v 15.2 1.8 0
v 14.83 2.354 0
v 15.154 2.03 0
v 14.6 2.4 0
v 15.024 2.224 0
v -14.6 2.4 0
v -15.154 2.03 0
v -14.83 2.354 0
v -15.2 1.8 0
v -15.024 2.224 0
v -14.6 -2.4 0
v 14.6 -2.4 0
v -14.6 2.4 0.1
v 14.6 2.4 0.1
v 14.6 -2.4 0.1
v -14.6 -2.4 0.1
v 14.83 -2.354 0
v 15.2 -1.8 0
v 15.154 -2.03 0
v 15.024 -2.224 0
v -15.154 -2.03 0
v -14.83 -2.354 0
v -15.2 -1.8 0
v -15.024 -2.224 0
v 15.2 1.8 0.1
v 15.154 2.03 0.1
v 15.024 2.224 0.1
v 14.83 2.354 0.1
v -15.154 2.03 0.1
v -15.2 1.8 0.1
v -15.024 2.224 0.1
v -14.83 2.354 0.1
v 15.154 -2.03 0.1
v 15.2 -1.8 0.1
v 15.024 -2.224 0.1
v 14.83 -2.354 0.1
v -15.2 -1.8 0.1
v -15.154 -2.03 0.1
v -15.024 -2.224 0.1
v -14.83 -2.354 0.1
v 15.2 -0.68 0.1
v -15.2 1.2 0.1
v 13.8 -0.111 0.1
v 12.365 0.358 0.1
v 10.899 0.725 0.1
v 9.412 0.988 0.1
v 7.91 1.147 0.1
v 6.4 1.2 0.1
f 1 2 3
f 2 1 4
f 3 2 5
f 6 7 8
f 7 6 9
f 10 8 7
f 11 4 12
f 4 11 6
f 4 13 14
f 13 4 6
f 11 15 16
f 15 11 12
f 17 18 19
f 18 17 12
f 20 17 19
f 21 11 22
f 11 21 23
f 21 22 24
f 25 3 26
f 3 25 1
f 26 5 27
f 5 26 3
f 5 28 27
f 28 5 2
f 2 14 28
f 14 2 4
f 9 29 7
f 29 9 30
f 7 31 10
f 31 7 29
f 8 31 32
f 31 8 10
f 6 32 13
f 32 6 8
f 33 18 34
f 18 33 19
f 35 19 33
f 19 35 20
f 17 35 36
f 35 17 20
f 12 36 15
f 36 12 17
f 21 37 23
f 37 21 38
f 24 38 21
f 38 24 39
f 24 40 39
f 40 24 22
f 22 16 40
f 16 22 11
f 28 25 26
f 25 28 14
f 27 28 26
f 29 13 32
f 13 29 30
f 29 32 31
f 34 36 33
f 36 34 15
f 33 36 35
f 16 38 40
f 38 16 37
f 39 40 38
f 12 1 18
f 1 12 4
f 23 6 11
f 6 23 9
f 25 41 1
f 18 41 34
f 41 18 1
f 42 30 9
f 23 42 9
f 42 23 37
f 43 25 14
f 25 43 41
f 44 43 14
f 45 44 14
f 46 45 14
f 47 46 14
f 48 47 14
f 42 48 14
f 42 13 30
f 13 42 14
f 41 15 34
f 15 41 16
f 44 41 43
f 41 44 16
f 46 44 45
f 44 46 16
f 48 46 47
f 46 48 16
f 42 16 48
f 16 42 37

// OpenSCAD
// file: ../p/box3u12.scad
use <../lib.scad>
function ldraw_lib__box3u12() = [
// 0 Box with 3 Parallel Faces without Any Edges
// 0 Name: box3u12.dat
// 0 Author: J.C. Tchang [tchang]
// 0 !LDRAW_ORG Primitive UPDATE 2014-02
// 0 !LICENSE Licensed under CC BY 4.0 : see CAreadme.txt
// 
// 0 BFC CERTIFY CCW
  [0,"BFC","CERTIFY"],
  [0,"BFC","CCW"],
// 
// 0 !HISTORY 2014-12-23 [PTadmin] Official Update 2014-02
// 
// 
// 4 16 -1 1 1 1 1 1 1 1 -1 -1 1 -1
  [4,16,-1,1,1,1,1,1,1,1,-1,-1,1,-1],
// 4 16 -1 1 1 -1 0 1 1 0 1 1 1 1
  [4,16,-1,1,1,-1,0,1,1,0,1,1,1,1],
// 4 16 1 1 -1 1 0 -1 -1 0 -1 -1 1 -1
  [4,16,1,1,-1,1,0,-1,-1,0,-1,-1,1,-1],
];
module ldraw_lib__box3u12(step=0, col=false, unit=2/5, alt=false, line=0.2, solid=!$preview)
    makepoly(ldraw_lib__box3u12(), step=step, col=col, unit=unit, alt=alt, line=line, solid=solid);
ldraw_lib__box3u12(line=0.2);
// file: ../p/1-4cyli.scad
use <../lib.scad>
function ldraw_lib__1_4cyli() = [
// 0 Cylinder 0.25
// 0 Name: 1-4cyli.dat
// 0 Author: James Jessiman
// 0 !LDRAW_ORG Primitive UPDATE 2012-01
// 0 !LICENSE Licensed under CC BY 4.0 : see CAreadme.txt
// 
// 0 BFC CERTIFY CCW
  [0,"BFC","CERTIFY"],
  [0,"BFC","CCW"],
// 
// 0 !HISTORY 2002-03-23 [sbliss] Added BFC statement.
// 0 !HISTORY 2002-04-25 [PTadmin] Official Update 2002-02
// 0 !HISTORY 2007-06-22 [PTadmin] Header formatted for Contributor Agreement
// 0 !HISTORY 2008-07-01 [PTadmin] Official Update 2008-01
// 0 !HISTORY 2012-02-16 [Philo] Changed to CCW
// 0 !HISTORY 2012-03-30 [PTadmin] Official Update 2012-01
// 
// 
// 4 16 1 1 0 0.9239 1 0.3827 0.9239 0 0.3827 1 0 0
  [4,16,1,1,0,0.9239,1,0.3827,0.9239,0,0.3827,1,0,0],
// 5 24 1 0 0 1 1 0 0.9239 0 0.3827 1 0 -1
  [5,24,1,0,0,1,1,0,0.9239,0,0.3827,1,0,-1],
// 4 16 0.9239 1 0.3827 0.7071 1 0.7071 0.7071 0 0.7071 0.9239 0 0.3827
  [4,16,0.9239,1,0.3827,0.7071,1,0.7071,0.7071,0,0.7071,0.9239,0,0.3827],
// 5 24 0.9239 0 0.3827 0.9239 1 0.3827 0.7071 0 0.7071 1 0 0
  [5,24,0.9239,0,0.3827,0.9239,1,0.3827,0.7071,0,0.7071,1,0,0],
// 4 16 0.7071 1 0.7071 0.3827 1 0.9239 0.3827 0 0.9239 0.7071 0 0.7071
  [4,16,0.7071,1,0.7071,0.3827,1,0.9239,0.3827,0,0.9239,0.7071,0,0.7071],
// 5 24 0.7071 0 0.7071 0.7071 1 0.7071 0.3827 0 0.9239 0.9239 0 0.3827
  [5,24,0.7071,0,0.7071,0.7071,1,0.7071,0.3827,0,0.9239,0.9239,0,0.3827],
// 4 16 0.3827 1 0.9239 0 1 1 0 0 1 0.3827 0 0.9239
  [4,16,0.3827,1,0.9239,0,1,1,0,0,1,0.3827,0,0.9239],
// 5 24 0.3827 0 0.9239 0.3827 1 0.9239 0 0 1 0.7071 0 0.7071
  [5,24,0.3827,0,0.9239,0.3827,1,0.9239,0,0,1,0.7071,0,0.7071],
// 5 24 0 0 1 0 1 1 0.3827 0 0.9239 -1 0 1
  [5,24,0,0,1,0,1,1,0.3827,0,0.9239,-1,0,1],
];
module ldraw_lib__1_4cyli(step=0, col=false, unit=2/5, alt=false, line=0.2, solid=!$preview)
    makepoly(ldraw_lib__1_4cyli(), step=step, col=col, unit=unit, alt=alt, line=line, solid=solid);
ldraw_lib__1_4cyli(line=0.2);
// file: ../p/1-4chrd.scad
use <../lib.scad>
function ldraw_lib__1_4chrd() = [
// 0 Chord 0.25
// 0 Name: 1-4chrd.dat
// 0 Author: Max Martin Richter [MMR1988]
// 0 !LDRAW_ORG Primitive UPDATE 2023-05
// 0 !LICENSE Licensed under CC BY 4.0 : see CAreadme.txt
// 
// 0 BFC CERTIFY CCW
  [0,"BFC","CERTIFY"],
  [0,"BFC","CCW"],
// 
// 0 !HISTORY 2004-04-22 [PTadmin] Official Update 2004-02
// 0 !HISTORY 2007-10-09 [PTadmin] Header formatted for Contributor Agreement
// 0 !HISTORY 2008-07-01 [PTadmin] Official Update 2008-01
// 0 !HISTORY 2012-08-02 [MMR1988] Re-creation with PrimGen2 and Rectifier
// 0 !HISTORY 2012-08-09 [PTadmin] Official Update 2012-02
// 0 !HISTORY 2023-10-27 [OrionP] Change author to MMR1988 from hafhead
// 0 !HISTORY 2023-10-31 [OrionP] Official Update 2023-05
// 
// 4 16 0.9239 0 0.3827 0.3827 0 0.9239 0 0 1 1 0 0
  [4,16,0.9239,0,0.3827,0.3827,0,0.9239,0,0,1,1,0,0],
// 3 16 0.7071 0 0.7071 0.3827 0 0.9239 0.9239 0 0.3827
  [3,16,0.7071,0,0.7071,0.3827,0,0.9239,0.9239,0,0.3827],
];
module ldraw_lib__1_4chrd(step=0, col=false, unit=2/5, alt=false, line=0.2, solid=!$preview)
    makepoly(ldraw_lib__1_4chrd(), step=step, col=col, unit=unit, alt=alt, line=line, solid=solid);
ldraw_lib__1_4chrd(line=0.2);
// file: 6221655r.scad
use <../lib.scad>
use <../p/1-4chrd.scad>
use <../p/1-4cyli.scad>
use <../p/box3u12.scad>
function ldraw_lib__6221655r() = [
// 0 Sticker  0.6 x  3.8 with Red Stripe on Black Background Right
// 0 Name: 6221655r.dat
// 0 Author: Massimo Maso [Sirio]
// 0 !LDRAW_ORG Part UPDATE 2024-09
// 0 !LICENSE Licensed under CC BY 4.0 : see CAreadme.txt
// 
// 0 BFC CERTIFY CCW
  [0,"BFC","CERTIFY"],
  [0,"BFC","CCW"],
// 
// 0 !KEYWORDS 3.0, 911 RSR, Porsche, Set 75888, Speed Champions, Turbo
// 
// 0 !HISTORY 2024-10-27 [OrionP] Official Update 2024-09
// 
// 0 // Primitives
// 1 16 -36.5 0 4.5 -1.5 0 0 0 -1 0 0 0 1.5 1-4chrd.dat
  [1,16,-36.5,0,4.5,-1.5,0,0,0,-1,0,0,0,1.5, ldraw_lib__1_4chrd()],
// 1 16 36.5 0 4.5 1.5 0 0 0 -1 0 0 0 1.5 1-4chrd.dat
  [1,16,36.5,0,4.5,1.5,0,0,0,-1,0,0,0,1.5, ldraw_lib__1_4chrd()],
// 1 16 0 -.25 0 36.5 0 0 0 .25 0 0 0 6 box3u12.dat
  [1,16,0,-.25,0,36.5,0,0,0,.25,0,0,0,6, ldraw_lib__box3u12()],
// 1 16 -36.5 0 -4.5 -1.5 0 0 0 -1 0 0 0 -1.5 1-4chrd.dat
  [1,16,-36.5,0,-4.5,-1.5,0,0,0,-1,0,0,0,-1.5, ldraw_lib__1_4chrd()],
// 1 16 36.5 0 -4.5 1.5 0 0 0 -1 0 0 0 -1.5 1-4chrd.dat
  [1,16,36.5,0,-4.5,1.5,0,0,0,-1,0,0,0,-1.5, ldraw_lib__1_4chrd()],
// 1 16 -36.5 -.25 4.5 -1.5 0 0 0 .25 0 0 0 1.5 1-4cyli.dat
  [1,16,-36.5,-.25,4.5,-1.5,0,0,0,.25,0,0,0,1.5, ldraw_lib__1_4cyli()],
// 1 16 36.5 -.25 4.5 1.5 0 0 0 .25 0 0 0 1.5 1-4cyli.dat
  [1,16,36.5,-.25,4.5,1.5,0,0,0,.25,0,0,0,1.5, ldraw_lib__1_4cyli()],
// 1 16 -36.5 -.25 -4.5 -1.5 0 0 0 .25 0 0 0 -1.5 1-4cyli.dat
  [1,16,-36.5,-.25,-4.5,-1.5,0,0,0,.25,0,0,0,-1.5, ldraw_lib__1_4cyli()],
// 1 16 36.5 -.25 -4.5 1.5 0 0 0 .25 0 0 0 -1.5 1-4cyli.dat
  [1,16,36.5,-.25,-4.5,1.5,0,0,0,.25,0,0,0,-1.5, ldraw_lib__1_4cyli()],
// 1 0 -36.5 -.25 4.5 -1.5 0 0 0 1 0 0 0 1.5 1-4chrd.dat
  [1,0,-36.5,-.25,4.5,-1.5,0,0,0,1,0,0,0,1.5, ldraw_lib__1_4chrd()],
// 1 0 36.5 -.25 4.5 1.5 0 0 0 1 0 0 0 1.5 1-4chrd.dat
  [1,0,36.5,-.25,4.5,1.5,0,0,0,1,0,0,0,1.5, ldraw_lib__1_4chrd()],
// 1 4 -36.5 -.25 -4.5 -1.5 0 0 0 1 0 0 0 -1.5 1-4chrd.dat
  [1,4,-36.5,-.25,-4.5,-1.5,0,0,0,1,0,0,0,-1.5, ldraw_lib__1_4chrd()],
// 1 4 36.5 -.25 -4.5 1.5 0 0 0 1 0 0 0 -1.5 1-4chrd.dat
  [1,4,36.5,-.25,-4.5,1.5,0,0,0,1,0,0,0,-1.5, ldraw_lib__1_4chrd()],
// 0 // Bottom face
// 4 16 -36.5 0 6 -36.5 0 -6 -38 0 -4.5 -38 0 4.5
  [4,16,-36.5,0,6,-36.5,0,-6,-38,0,-4.5,-38,0,4.5],
// 4 16 36.5 0 6 38 0 4.5 38 0 -4.5 36.5 0 -6
  [4,16,36.5,0,6,38,0,4.5,38,0,-4.5,36.5,0,-6],
// 0 // Lateral face
// 3 16 -38 0 4.5 -38 -.25 -1.7 -38 -.25 4.5
  [3,16,-38,0,4.5,-38,-.25,-1.7,-38,-.25,4.5],
// 4 16 -38 0 4.5 -38 0 -4.5 -38 -.25 -4.5 -38 -.25 -1.7
  [4,16,-38,0,4.5,-38,0,-4.5,-38,-.25,-4.5,-38,-.25,-1.7],
// 3 16 38 0 4.5 38 -.25 4.5 38 -.25 3
  [3,16,38,0,4.5,38,-.25,4.5,38,-.25,3],
// 4 16 38 0 4.5 38 -.25 3 38 -.25 -4.5 38 0 -4.5
  [4,16,38,0,4.5,38,-.25,3,38,-.25,-4.5,38,0,-4.5],
// 0 // Top face
// 0 // Black faces
// 4 0 -36.5 -.25 6 -38 -.25 4.5 -38 -.25 -1.7 -34.5012 -.25 -.2787
  [4,0,-36.5,-.25,6,-38,-.25,4.5,-38,-.25,-1.7,-34.5012,-.25,-.2787],
// 3 0 -36.5 -.25 6 -34.5012 -.25 -.2787 -30.9114 -.25 .8939
  [3,0,-36.5,-.25,6,-34.5012,-.25,-.2787,-30.9114,-.25,.8939],
// 3 0 -36.5 -.25 6 -30.9114 -.25 .8939 -27.2482 -.25 1.8119
  [3,0,-36.5,-.25,6,-30.9114,-.25,.8939,-27.2482,-.25,1.8119],
// 3 0 -36.5 -.25 6 -27.2482 -.25 1.8119 -23.5297 -.25 2.4709
  [3,0,-36.5,-.25,6,-27.2482,-.25,1.8119,-23.5297,-.25,2.4709],
// 3 0 -36.5 -.25 6 -23.5297 -.25 2.4709 -19.7741 -.25 2.8676
  [3,0,-36.5,-.25,6,-23.5297,-.25,2.4709,-19.7741,-.25,2.8676],
// 3 0 -36.5 -.25 6 -19.7741 -.25 2.8676 -16 -.25 3
  [3,0,-36.5,-.25,6,-19.7741,-.25,2.8676,-16,-.25,3],
// 3 0 -36.5 -.25 6 -16 -.25 3 38 -.25 3
  [3,0,-36.5,-.25,6,-16,-.25,3,38,-.25,3],
// 4 0 -36.5 -.25 6 38 -.25 3 38 -.25 4.5 36.5 -.25 6
  [4,0,-36.5,-.25,6,38,-.25,3,38,-.25,4.5,36.5,-.25,6],
// 0 // Red faces
// 4 4 36.5 -.25 -6 -38 -.25 -1.7 -38 -.25 -4.5 -36.5 -.25 -6
  [4,4,36.5,-.25,-6,-38,-.25,-1.7,-38,-.25,-4.5,-36.5,-.25,-6],
// 4 4 36.5 -.25 -6 -30.9114 -.25 .8939 -34.5012 -.25 -.2787 -38 -.25 -1.7
  [4,4,36.5,-.25,-6,-30.9114,-.25,.8939,-34.5012,-.25,-.2787,-38,-.25,-1.7],
// 4 4 36.5 -.25 -6 -23.5297 -.25 2.4709 -27.2482 -.25 1.8119 -30.9114 -.25 .8939
  [4,4,36.5,-.25,-6,-23.5297,-.25,2.4709,-27.2482,-.25,1.8119,-30.9114,-.25,.8939],
// 4 4 36.5 -.25 -6 -16 -.25 3 -19.7741 -.25 2.8676 -23.5297 -.25 2.4709
  [4,4,36.5,-.25,-6,-16,-.25,3,-19.7741,-.25,2.8676,-23.5297,-.25,2.4709],
// 4 4 36.5 -.25 -6 38 -.25 -4.5 38 -.25 3 -16 -.25 3
  [4,4,36.5,-.25,-6,38,-.25,-4.5,38,-.25,3,-16,-.25,3],
];
module ldraw_lib__6221655r(step=0, col=false, unit=2/5, alt=false, line=0.2, solid=!$preview)
    makepoly(ldraw_lib__6221655r(), step=step, col=col, unit=unit, alt=alt, line=line, solid=solid);
ldraw_lib__6221655r(line=0.2);
// main file
use <../lib.scad>
use <6221655r.scad>
function ldraw_lib__6221655w() = [
// 0 Sticker  0.6 x  3.8 with Red Stripe on Black Background Left
// 0 Name: 6221655w.dat
// 0 Author: Massimo Maso [Sirio]
// 0 !LDRAW_ORG Part UPDATE 2024-09
// 0 !LICENSE Licensed under CC BY 4.0 : see CAreadme.txt
// 
// 0 BFC CERTIFY CCW
  [0,"BFC","CERTIFY"],
  [0,"BFC","CCW"],
// 
// 0 !KEYWORDS 3.0, 911 RSR, Porsche, Set 75888, Speed Champions, Turbo
// 
// 0 !HISTORY 2024-10-27 [OrionP] Official Update 2024-09
// 
// 1 16 0 0 0 -1 0 0 0 1 0 0 0 1 6221655r.dat
  [1,16,0,0,0,-1,0,0,0,1,0,0,0,1, ldraw_lib__6221655r()],
];
module ldraw_lib__6221655w(step=0, col=false, unit=2/5, alt=false, line=0.2, solid=!$preview)
    makepoly(ldraw_lib__6221655w(), step=step, col=col, unit=unit, alt=alt, line=line, solid=solid);
ldraw_lib__6221655w(line=0.2);
